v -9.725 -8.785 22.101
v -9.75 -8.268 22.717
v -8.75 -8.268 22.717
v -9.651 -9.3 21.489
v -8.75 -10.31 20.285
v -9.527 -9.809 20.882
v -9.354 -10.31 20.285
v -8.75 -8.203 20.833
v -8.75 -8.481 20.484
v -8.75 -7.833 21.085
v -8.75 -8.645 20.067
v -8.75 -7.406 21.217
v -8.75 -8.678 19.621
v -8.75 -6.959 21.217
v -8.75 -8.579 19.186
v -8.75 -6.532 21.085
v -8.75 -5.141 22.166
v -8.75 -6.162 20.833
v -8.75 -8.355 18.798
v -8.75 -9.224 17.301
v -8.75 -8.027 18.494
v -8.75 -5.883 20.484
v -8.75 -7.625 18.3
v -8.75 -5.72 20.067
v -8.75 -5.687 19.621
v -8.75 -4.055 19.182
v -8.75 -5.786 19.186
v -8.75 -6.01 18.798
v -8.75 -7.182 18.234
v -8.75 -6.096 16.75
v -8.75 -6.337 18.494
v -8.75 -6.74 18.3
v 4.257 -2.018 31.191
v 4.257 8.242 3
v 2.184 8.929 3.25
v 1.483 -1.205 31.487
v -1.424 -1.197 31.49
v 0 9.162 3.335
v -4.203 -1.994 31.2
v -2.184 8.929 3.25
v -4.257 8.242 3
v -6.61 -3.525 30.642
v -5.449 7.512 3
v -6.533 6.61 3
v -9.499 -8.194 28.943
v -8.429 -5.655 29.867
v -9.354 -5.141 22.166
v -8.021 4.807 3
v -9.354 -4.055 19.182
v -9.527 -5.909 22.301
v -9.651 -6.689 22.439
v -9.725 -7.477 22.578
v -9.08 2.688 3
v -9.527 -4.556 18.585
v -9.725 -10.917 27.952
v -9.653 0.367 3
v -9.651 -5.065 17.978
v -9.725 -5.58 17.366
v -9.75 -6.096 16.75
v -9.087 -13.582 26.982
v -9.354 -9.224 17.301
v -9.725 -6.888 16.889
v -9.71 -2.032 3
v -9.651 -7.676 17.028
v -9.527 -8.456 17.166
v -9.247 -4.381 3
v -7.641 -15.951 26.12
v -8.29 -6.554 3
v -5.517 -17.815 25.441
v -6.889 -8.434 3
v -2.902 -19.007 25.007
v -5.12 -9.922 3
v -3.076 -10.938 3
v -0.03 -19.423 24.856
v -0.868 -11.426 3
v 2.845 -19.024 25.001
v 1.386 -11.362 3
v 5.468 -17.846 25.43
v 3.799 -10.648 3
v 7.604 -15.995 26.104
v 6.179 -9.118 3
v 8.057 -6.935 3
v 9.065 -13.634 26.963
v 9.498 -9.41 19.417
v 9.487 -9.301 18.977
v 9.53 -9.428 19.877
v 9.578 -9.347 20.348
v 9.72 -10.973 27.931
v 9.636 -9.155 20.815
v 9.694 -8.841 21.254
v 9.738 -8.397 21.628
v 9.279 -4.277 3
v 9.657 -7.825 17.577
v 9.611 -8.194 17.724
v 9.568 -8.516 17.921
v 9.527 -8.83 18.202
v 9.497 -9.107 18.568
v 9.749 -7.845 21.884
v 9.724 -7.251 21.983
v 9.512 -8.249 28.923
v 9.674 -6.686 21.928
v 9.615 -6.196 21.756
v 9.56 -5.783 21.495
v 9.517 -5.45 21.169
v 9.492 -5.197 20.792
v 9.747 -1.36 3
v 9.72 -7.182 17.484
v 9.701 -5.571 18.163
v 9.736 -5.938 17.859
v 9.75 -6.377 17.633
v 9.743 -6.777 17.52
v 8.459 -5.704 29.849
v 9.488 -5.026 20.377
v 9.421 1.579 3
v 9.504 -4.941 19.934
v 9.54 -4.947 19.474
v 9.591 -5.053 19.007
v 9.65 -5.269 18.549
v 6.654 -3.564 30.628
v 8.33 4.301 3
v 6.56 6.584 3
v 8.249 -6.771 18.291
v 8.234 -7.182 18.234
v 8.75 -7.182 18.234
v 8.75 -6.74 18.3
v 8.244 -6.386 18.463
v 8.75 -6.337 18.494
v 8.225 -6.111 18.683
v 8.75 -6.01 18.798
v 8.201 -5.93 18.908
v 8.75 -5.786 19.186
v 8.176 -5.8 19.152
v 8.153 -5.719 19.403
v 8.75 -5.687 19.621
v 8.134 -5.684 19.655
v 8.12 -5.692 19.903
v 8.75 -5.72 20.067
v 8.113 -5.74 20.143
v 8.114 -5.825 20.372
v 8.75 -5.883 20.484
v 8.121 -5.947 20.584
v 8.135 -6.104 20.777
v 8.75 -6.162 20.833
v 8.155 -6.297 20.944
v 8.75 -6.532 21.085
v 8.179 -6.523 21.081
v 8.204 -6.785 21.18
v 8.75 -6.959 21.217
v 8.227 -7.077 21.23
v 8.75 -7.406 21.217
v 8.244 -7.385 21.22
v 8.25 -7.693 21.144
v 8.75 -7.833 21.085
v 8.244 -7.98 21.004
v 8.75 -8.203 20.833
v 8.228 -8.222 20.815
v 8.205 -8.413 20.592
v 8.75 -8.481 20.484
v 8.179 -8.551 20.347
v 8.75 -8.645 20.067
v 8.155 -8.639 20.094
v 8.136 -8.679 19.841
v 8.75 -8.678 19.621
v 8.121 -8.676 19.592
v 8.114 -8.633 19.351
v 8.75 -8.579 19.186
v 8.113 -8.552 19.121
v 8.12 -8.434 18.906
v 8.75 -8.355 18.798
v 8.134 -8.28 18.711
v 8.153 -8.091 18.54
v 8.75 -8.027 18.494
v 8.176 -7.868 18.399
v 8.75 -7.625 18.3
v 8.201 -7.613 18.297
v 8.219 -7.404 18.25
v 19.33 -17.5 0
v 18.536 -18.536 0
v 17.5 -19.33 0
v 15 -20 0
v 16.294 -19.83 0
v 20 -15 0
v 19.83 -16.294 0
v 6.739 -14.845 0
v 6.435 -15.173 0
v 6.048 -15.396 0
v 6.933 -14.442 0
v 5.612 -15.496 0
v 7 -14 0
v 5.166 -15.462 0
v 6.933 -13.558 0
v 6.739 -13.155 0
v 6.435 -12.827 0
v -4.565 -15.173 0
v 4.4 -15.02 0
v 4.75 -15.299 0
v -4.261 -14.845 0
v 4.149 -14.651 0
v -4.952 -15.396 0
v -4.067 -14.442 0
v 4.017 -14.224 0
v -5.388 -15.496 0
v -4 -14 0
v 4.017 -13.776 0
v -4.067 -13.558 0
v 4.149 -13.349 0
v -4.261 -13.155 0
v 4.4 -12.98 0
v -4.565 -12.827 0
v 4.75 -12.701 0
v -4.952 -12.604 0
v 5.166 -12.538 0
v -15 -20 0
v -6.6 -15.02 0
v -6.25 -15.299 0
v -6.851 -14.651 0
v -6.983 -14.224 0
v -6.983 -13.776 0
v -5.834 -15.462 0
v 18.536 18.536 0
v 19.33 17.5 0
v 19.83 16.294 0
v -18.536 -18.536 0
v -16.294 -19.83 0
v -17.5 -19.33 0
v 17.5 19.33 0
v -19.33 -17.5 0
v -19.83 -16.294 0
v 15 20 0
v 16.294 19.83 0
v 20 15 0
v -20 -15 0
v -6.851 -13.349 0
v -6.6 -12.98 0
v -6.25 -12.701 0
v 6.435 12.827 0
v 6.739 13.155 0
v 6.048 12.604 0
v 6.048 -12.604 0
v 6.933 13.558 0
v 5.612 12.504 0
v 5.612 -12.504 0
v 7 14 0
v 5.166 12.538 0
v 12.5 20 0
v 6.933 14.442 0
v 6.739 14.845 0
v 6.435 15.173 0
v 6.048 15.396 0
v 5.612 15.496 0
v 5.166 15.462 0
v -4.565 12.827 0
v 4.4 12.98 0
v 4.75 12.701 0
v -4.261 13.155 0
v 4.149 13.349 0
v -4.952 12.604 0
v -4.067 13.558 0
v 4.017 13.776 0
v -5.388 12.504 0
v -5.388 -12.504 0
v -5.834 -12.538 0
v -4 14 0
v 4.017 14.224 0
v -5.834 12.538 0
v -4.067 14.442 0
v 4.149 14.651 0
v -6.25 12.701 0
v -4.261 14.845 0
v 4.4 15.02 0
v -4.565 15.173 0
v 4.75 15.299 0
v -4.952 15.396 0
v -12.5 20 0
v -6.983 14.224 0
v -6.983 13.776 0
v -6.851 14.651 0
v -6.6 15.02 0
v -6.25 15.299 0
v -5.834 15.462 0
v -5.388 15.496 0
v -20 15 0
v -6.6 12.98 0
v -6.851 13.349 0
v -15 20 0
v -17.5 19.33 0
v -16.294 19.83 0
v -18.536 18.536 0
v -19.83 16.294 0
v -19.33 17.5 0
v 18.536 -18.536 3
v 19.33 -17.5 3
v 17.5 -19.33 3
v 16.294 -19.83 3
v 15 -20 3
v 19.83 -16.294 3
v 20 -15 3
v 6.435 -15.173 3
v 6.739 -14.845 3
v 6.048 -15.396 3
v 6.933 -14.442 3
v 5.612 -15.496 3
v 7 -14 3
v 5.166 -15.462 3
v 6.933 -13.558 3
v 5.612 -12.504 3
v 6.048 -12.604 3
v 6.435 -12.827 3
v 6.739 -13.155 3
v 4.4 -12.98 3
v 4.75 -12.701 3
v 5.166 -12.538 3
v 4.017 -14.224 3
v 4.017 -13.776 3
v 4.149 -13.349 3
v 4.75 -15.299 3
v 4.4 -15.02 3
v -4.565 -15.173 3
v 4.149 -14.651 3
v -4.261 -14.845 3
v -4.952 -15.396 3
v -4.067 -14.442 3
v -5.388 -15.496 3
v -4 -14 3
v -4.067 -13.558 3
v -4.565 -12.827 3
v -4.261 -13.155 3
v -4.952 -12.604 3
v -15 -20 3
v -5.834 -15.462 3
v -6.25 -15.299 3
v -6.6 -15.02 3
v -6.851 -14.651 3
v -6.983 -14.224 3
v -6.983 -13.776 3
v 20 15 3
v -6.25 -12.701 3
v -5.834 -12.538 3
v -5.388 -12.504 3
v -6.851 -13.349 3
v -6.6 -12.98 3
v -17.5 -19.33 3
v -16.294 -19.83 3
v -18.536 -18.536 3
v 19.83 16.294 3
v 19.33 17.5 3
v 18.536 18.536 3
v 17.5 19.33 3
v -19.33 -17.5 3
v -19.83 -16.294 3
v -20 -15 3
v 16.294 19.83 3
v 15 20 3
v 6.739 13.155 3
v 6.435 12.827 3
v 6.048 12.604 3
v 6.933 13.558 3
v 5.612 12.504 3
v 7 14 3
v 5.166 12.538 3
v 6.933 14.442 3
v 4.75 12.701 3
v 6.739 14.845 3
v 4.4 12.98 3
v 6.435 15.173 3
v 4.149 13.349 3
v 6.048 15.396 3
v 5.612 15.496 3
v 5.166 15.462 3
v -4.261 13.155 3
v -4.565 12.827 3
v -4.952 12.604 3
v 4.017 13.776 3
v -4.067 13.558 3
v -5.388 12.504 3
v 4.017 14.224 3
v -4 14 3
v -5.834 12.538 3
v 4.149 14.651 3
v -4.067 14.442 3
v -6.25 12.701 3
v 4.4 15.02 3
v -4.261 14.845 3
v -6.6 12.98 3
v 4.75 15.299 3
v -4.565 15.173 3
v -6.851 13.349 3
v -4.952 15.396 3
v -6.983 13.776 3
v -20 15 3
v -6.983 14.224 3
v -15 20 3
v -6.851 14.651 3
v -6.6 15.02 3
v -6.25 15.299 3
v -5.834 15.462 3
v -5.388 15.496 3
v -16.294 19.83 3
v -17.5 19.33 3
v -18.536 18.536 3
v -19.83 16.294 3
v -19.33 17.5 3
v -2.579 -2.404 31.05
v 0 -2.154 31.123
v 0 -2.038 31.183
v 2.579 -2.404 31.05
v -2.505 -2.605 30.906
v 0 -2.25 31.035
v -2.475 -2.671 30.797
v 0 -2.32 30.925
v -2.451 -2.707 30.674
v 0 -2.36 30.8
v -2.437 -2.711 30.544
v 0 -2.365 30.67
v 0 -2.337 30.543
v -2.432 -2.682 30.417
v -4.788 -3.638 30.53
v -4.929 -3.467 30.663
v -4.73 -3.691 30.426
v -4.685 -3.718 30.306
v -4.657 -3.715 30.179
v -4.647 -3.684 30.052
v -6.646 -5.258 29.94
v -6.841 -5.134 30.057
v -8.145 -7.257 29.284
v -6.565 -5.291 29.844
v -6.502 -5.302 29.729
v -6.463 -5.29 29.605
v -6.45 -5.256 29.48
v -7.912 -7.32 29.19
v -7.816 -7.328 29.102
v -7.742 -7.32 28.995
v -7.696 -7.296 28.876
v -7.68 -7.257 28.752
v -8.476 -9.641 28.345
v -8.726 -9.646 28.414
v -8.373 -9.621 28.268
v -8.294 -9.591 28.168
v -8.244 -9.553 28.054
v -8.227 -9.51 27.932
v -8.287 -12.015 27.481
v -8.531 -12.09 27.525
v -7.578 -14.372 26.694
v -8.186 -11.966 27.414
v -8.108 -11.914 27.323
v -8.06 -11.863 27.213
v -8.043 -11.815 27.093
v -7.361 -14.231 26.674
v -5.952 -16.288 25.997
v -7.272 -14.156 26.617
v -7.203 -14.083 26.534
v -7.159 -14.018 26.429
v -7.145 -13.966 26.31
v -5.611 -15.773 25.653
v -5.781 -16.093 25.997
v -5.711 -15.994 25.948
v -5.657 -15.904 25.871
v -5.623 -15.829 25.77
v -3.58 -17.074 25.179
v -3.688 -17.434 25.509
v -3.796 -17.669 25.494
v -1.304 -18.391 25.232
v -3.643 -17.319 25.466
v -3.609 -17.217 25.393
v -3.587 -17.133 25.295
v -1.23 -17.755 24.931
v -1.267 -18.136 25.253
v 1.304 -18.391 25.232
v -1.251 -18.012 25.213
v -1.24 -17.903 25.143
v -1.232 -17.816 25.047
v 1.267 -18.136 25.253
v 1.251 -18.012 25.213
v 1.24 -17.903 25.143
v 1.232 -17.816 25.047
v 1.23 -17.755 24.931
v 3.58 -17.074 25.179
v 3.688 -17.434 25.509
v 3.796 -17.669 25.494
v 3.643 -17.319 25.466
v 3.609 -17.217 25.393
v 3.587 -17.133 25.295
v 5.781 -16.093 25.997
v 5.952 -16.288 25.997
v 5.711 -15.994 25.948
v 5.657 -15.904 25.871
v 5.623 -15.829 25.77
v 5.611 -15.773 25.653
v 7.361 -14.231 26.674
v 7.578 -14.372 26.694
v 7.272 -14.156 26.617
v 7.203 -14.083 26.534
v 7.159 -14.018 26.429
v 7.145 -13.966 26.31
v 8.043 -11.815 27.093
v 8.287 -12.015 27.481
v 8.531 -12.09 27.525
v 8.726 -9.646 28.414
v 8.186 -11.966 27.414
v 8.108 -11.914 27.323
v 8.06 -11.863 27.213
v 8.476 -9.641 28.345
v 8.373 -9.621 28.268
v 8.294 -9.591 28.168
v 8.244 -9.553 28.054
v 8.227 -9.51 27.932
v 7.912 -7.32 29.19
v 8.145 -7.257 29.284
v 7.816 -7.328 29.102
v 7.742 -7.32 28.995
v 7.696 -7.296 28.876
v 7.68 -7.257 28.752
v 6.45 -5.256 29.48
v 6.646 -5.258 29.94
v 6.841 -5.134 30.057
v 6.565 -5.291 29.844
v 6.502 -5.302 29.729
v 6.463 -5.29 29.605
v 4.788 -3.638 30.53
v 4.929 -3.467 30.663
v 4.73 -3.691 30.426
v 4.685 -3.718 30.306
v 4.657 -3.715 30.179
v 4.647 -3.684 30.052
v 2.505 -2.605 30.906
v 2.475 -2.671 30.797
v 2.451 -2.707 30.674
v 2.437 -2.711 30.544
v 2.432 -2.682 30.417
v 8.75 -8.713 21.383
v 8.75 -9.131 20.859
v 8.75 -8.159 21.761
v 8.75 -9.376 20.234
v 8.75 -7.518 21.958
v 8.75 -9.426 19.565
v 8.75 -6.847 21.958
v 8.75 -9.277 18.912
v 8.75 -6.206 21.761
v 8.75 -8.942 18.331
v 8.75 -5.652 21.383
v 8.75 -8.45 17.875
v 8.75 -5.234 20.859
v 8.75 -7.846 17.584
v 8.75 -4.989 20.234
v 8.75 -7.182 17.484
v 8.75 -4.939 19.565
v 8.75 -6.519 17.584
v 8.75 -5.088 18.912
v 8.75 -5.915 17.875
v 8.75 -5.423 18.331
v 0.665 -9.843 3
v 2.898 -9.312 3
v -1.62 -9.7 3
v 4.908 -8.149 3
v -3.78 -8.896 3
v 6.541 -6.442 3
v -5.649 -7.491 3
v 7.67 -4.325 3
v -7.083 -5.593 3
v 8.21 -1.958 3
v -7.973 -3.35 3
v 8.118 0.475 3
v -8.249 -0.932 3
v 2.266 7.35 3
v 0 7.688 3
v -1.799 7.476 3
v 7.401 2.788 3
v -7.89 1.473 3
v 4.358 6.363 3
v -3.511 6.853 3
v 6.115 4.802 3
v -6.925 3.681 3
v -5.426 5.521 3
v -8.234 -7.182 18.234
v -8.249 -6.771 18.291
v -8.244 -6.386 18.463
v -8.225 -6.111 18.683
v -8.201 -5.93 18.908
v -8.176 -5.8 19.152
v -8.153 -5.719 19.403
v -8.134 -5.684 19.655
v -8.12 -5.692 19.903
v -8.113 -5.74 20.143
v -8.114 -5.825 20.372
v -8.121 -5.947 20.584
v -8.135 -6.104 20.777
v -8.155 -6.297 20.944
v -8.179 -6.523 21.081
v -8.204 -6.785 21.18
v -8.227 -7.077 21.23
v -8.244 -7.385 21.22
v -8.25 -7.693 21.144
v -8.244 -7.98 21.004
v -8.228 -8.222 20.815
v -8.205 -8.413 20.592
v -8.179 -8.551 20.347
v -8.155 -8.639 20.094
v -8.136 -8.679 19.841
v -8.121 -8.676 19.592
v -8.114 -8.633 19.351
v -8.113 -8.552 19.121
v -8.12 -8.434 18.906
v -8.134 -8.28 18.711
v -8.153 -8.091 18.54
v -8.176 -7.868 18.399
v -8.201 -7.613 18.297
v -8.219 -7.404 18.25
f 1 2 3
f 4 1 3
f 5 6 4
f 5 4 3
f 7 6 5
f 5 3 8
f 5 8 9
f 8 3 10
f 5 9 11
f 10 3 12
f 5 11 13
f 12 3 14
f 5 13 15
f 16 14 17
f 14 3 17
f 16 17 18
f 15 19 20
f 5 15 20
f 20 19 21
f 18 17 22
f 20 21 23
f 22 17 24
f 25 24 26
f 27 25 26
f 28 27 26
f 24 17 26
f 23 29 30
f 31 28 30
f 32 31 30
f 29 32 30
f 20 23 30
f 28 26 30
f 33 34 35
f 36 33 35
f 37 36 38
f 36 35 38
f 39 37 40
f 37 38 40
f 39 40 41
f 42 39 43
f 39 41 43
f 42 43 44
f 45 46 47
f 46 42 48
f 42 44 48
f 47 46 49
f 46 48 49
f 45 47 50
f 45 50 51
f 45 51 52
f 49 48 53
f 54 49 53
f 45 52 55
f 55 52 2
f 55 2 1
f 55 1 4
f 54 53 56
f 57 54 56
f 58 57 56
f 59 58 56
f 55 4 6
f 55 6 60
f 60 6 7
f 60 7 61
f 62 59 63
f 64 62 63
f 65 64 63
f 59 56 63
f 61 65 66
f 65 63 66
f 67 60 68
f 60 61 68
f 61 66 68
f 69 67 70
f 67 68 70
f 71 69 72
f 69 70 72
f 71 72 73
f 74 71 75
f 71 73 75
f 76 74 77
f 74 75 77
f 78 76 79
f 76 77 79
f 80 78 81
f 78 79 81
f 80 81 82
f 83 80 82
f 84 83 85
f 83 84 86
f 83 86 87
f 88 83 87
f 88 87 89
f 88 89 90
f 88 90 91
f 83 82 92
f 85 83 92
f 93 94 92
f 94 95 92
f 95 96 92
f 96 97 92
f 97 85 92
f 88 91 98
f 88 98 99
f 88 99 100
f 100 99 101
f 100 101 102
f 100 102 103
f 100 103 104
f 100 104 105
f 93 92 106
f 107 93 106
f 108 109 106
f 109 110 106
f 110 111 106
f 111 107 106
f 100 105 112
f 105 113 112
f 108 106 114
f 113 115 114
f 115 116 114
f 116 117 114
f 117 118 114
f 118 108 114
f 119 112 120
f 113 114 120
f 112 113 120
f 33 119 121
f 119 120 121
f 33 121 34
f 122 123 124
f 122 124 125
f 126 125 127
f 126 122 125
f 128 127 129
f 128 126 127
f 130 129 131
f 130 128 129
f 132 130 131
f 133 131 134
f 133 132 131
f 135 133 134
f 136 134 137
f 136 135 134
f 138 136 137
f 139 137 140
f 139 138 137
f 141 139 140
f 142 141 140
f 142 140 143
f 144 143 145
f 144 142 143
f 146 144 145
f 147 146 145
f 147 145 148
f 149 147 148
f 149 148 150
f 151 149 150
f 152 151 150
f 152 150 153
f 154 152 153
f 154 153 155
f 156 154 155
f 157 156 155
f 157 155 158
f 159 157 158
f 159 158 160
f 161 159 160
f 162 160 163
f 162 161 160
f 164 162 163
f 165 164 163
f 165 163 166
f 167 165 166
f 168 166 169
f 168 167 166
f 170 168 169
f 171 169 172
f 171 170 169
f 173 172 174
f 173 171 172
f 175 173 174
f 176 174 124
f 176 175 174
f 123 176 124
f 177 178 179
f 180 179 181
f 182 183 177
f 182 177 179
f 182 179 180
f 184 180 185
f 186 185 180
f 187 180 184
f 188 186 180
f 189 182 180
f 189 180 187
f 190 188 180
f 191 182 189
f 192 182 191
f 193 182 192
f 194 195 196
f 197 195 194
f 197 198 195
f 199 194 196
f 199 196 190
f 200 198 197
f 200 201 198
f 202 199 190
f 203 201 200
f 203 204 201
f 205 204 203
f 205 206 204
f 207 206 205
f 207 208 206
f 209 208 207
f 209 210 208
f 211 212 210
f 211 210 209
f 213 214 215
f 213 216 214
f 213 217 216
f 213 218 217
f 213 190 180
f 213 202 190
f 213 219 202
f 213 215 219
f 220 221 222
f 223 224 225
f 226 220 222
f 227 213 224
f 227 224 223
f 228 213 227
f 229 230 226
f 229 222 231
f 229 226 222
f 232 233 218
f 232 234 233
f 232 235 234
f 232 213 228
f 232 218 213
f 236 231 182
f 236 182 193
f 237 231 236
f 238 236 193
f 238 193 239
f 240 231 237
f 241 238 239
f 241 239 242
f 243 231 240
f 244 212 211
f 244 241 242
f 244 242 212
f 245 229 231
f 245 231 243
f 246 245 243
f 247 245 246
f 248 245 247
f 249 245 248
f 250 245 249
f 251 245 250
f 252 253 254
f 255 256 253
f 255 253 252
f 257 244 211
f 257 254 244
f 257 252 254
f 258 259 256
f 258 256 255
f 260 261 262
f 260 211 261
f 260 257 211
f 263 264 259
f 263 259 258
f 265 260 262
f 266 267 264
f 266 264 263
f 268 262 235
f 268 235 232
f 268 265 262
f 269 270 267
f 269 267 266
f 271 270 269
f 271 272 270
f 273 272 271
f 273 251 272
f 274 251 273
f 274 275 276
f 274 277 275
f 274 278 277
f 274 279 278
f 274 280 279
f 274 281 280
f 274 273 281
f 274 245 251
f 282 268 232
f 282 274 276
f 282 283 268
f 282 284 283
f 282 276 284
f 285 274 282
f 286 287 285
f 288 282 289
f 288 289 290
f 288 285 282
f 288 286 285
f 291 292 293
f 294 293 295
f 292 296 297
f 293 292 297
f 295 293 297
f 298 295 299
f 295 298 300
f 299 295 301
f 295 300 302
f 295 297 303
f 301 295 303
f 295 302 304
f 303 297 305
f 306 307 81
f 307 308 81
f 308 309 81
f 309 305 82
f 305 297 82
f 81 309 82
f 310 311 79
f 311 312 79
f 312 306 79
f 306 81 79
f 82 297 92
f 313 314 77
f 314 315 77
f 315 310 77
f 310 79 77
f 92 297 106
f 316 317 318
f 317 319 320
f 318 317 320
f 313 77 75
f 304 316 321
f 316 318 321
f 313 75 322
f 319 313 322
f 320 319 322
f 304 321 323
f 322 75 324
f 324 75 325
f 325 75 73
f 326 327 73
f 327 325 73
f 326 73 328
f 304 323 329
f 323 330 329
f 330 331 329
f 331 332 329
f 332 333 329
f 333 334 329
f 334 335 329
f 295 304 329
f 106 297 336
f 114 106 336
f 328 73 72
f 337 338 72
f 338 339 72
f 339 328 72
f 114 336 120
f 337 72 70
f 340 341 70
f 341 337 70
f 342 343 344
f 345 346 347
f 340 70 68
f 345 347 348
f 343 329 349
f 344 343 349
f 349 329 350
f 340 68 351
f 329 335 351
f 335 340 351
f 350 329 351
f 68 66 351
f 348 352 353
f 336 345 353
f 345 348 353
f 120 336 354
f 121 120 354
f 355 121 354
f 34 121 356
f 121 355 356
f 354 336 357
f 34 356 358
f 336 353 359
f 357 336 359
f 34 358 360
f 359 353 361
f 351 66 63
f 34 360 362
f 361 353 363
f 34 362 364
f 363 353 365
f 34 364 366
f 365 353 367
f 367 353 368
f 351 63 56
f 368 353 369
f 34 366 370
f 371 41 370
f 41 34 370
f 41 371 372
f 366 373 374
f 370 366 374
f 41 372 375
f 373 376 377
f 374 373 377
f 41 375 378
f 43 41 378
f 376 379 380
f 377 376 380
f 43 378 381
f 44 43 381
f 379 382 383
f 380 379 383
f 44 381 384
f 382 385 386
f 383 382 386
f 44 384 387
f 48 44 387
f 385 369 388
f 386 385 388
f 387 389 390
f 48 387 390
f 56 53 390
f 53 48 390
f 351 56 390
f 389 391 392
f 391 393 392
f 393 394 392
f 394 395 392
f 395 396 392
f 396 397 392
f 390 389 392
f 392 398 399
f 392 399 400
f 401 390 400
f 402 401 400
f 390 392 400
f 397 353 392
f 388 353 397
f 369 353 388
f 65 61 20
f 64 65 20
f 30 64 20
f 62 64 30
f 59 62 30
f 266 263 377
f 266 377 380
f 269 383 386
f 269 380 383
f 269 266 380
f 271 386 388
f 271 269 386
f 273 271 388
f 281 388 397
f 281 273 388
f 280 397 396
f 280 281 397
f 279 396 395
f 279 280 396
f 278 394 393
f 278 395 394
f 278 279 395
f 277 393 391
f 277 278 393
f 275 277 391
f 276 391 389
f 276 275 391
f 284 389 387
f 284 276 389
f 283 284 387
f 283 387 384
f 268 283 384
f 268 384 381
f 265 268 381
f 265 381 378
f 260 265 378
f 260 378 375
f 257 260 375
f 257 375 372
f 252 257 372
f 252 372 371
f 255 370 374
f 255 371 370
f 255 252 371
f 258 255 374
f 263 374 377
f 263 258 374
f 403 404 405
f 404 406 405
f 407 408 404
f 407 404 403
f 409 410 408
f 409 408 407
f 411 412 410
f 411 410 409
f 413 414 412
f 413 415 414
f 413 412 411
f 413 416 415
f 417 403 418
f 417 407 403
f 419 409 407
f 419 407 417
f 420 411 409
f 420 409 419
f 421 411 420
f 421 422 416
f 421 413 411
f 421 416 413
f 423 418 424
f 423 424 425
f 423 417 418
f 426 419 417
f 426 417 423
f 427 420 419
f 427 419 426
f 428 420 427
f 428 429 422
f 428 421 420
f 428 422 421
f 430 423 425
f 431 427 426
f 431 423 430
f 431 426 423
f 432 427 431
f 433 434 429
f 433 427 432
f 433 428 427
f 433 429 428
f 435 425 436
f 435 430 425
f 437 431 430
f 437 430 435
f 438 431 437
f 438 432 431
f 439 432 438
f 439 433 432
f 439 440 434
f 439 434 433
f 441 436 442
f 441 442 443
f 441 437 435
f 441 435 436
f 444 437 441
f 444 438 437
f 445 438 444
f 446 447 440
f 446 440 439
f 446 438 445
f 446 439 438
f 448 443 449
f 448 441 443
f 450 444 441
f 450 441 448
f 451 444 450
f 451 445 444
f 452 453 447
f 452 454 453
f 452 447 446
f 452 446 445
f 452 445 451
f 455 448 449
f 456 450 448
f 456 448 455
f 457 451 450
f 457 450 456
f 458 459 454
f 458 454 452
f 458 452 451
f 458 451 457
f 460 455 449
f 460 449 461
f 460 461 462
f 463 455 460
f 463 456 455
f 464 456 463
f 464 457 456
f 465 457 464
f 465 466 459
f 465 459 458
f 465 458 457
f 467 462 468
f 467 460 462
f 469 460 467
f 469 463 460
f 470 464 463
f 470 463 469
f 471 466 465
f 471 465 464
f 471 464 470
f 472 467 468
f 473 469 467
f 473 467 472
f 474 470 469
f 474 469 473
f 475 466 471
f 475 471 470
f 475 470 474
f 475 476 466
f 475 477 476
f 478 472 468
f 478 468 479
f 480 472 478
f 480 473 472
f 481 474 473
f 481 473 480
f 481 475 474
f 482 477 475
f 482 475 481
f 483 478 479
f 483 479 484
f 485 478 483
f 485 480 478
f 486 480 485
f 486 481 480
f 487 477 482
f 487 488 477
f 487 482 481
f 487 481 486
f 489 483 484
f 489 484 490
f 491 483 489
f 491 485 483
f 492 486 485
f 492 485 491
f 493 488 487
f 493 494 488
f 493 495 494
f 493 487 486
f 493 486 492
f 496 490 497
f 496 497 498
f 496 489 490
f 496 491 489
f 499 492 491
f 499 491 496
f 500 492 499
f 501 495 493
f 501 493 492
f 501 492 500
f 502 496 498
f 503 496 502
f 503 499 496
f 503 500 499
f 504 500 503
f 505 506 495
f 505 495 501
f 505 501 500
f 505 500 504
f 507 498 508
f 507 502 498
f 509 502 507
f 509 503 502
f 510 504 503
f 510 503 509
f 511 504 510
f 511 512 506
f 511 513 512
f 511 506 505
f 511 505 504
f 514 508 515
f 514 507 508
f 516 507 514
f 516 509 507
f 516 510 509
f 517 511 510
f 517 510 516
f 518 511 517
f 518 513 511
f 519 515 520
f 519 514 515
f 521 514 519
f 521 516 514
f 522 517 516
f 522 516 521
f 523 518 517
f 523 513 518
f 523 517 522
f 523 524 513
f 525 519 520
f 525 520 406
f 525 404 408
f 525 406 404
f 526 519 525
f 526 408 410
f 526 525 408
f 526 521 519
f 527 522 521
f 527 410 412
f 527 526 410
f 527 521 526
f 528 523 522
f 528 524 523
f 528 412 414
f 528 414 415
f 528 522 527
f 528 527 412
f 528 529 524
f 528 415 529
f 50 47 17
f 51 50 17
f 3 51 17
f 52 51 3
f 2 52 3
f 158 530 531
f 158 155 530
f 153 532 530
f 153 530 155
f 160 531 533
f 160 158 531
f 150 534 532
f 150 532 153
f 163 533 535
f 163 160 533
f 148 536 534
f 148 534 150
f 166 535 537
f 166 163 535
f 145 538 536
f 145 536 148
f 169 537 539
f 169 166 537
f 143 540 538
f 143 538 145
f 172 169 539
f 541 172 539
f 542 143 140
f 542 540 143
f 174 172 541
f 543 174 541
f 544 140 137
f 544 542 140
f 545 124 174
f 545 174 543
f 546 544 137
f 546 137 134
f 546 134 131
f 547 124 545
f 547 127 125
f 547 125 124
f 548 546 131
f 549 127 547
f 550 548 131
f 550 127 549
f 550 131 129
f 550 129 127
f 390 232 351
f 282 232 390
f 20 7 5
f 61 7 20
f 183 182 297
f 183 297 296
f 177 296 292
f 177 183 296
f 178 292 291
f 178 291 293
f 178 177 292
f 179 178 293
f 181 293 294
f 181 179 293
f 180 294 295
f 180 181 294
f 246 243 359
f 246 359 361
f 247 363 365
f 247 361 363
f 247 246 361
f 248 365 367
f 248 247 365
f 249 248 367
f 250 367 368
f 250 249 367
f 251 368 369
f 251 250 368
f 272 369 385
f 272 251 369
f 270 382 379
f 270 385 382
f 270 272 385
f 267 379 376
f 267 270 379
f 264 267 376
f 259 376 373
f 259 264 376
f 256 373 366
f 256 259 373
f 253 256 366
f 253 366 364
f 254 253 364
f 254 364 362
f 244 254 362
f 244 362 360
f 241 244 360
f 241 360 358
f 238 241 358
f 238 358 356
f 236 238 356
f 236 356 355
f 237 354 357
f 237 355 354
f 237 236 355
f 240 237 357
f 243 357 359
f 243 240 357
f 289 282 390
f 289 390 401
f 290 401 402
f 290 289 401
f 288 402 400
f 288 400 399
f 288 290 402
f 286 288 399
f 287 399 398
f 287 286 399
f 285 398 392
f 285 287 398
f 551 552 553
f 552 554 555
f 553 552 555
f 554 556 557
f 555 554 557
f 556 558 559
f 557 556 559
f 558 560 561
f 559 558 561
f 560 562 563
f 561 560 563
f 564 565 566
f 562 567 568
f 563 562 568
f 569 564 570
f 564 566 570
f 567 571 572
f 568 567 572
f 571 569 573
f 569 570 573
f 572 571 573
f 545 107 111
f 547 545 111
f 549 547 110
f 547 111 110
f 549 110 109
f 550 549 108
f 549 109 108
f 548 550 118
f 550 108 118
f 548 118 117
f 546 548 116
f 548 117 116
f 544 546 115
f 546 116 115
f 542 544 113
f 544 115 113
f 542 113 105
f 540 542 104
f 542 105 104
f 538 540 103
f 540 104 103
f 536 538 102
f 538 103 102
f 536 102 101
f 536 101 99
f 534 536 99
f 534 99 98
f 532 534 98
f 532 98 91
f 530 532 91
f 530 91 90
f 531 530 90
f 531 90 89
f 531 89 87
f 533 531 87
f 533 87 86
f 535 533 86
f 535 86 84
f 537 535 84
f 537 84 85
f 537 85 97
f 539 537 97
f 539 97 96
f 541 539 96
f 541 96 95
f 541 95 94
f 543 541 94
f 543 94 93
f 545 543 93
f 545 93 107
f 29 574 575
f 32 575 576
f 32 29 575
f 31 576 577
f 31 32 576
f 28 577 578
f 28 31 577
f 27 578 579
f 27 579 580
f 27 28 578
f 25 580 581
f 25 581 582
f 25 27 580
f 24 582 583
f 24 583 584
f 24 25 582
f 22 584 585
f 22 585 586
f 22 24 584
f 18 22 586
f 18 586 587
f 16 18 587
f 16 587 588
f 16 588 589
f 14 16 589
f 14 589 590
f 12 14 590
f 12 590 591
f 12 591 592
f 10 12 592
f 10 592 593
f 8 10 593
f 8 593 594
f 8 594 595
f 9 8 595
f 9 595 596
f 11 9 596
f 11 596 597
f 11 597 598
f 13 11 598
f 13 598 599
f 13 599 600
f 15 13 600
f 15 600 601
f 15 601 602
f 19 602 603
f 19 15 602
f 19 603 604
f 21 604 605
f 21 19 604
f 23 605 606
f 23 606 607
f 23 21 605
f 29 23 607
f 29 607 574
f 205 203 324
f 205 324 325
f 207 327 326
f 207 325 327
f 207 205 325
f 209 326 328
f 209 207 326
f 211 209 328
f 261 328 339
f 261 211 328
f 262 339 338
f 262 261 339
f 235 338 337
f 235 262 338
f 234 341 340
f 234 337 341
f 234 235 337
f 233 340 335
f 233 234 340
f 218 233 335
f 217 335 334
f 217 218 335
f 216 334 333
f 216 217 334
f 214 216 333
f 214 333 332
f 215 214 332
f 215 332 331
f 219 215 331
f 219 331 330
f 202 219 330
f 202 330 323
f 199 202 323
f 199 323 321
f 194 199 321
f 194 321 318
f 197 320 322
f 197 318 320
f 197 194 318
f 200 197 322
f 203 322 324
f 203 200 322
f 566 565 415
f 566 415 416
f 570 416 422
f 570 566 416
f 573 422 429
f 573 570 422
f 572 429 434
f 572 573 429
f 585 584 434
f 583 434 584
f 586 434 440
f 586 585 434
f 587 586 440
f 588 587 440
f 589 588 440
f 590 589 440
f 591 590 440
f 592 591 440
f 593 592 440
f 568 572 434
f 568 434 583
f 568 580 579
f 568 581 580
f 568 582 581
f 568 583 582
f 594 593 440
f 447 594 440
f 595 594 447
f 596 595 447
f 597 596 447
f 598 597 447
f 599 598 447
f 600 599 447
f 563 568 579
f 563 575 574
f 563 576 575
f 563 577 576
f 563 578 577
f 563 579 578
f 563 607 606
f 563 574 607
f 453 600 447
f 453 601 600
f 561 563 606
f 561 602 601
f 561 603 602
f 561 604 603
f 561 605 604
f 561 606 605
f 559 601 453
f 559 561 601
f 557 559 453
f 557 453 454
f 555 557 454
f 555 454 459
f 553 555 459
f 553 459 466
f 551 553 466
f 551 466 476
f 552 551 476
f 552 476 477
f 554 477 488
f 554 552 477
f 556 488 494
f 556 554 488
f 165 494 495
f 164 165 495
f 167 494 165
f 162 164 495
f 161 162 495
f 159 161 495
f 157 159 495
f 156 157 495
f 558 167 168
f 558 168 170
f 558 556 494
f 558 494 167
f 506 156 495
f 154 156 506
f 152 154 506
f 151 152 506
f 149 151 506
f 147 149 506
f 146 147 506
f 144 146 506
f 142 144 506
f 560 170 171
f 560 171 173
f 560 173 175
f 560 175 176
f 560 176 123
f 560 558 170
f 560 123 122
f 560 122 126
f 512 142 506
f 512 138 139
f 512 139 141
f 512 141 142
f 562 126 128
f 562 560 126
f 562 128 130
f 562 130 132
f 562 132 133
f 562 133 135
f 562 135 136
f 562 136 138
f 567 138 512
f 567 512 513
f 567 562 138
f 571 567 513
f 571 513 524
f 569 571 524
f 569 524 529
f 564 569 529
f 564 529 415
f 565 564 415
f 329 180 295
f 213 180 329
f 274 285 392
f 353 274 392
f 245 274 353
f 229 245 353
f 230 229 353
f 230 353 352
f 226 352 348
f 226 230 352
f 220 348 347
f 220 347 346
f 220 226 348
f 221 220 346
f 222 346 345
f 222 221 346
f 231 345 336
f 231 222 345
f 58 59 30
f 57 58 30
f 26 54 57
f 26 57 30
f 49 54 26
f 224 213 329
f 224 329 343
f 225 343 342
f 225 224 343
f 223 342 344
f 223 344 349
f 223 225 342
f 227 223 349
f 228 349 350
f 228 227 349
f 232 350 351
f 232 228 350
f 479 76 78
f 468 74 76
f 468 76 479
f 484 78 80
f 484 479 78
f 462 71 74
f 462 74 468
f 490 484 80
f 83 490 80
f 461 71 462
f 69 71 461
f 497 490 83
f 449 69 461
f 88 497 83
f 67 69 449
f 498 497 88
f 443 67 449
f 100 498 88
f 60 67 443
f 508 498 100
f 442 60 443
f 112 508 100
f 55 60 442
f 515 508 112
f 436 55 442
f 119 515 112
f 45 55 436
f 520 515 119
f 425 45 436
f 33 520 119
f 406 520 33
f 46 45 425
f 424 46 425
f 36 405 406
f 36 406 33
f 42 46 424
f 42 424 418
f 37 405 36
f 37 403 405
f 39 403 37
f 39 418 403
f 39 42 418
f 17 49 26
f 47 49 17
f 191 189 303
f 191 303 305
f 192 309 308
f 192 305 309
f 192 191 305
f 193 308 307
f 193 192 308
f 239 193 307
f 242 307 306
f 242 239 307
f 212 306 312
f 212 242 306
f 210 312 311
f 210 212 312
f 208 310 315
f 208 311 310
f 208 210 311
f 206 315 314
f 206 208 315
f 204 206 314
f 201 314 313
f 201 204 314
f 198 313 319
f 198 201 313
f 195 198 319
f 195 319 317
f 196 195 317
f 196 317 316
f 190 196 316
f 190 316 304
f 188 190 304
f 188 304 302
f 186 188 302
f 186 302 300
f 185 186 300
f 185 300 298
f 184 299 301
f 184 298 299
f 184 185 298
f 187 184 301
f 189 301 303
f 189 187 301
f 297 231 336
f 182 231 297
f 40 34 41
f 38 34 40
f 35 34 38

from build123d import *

# Parameters (mm, degrees)
EXTRUDE_1_DEPTH          = 3
CUT_EXTRUDE_2_DEPTH      = 29.442925307
CUT_EXTRUDE_2_DEPTH_BACK = 29.442925307
SKETCH_2_R               = 1.5
SKETCH_3_R               = 9.75
SKETCH_3_R_2             = 8.25
EXTRUDE_2_DEPTH          = 30
SKETCH_4_W               = 10.093928953
SKETCH_4_H               = 39.979180772
CUT_EXTRUDE_3_DEPTH      = 12.5
CUT_EXTRUDE_4_DEPTH      = 43.353932229
CUT_EXTRUDE_4_DEPTH_BACK = 43.353932229
SKETCH_5_R               = 1.5
SKETCH_6_R               = 2.25
CUT_EXTRUDE_5_DEPTH      = 1
CUT_EXTRUDE_6_DEPTH      = 1
FILLET_1_R               = 0.5


with BuildPart() as part:
    # 草圖1 → 填料-伸長1 (new body)
    with BuildSketch(Plane.XY):
        with BuildLine():
            Line((-15, 20), (15, 20))
            ThreePointArc((15, 20), (18.535533906, 18.535533906), (20, 15))
            Line((20, 15), (20, -15))
            ThreePointArc((20, -15), (18.535533906, -18.535533906), (15, -20))
            Line((15, -20), (-15, -20))
            ThreePointArc((-15, -20), (-18.535533906, -18.535533906), (-20, -15))
            Line((-20, -15), (-20, 15))
            ThreePointArc((-20, 15), (-18.535533906, 18.535533906), (-15, 20))
        make_face()
    extrude(amount=EXTRUDE_1_DEPTH)

    # 草圖2 → 除料-伸長2 (cut, two sides: drawn at the far end of the back side and taken through both)
    with BuildSketch(Plane.XY.offset(-CUT_EXTRUDE_2_DEPTH_BACK)):
        with Locations((-5.5, 14)):
            Circle(SKETCH_2_R)
        with Locations((5.5, 14)):
            Circle(SKETCH_2_R)
        with Locations((5.5, -14)):
            Circle(SKETCH_2_R)
        with Locations((-5.5, -14)):
            Circle(SKETCH_2_R)
    extrude(amount=CUT_EXTRUDE_2_DEPTH + CUT_EXTRUDE_2_DEPTH_BACK, mode=Mode.SUBTRACT)

    # 草圖3 → 填料-伸長2 (add)
    with BuildSketch(Plane(origin=(0, 0, 0), x_dir=(1, 0, 0), z_dir=(0, -0.34202014332566943, 0.9396926207859081))):
        Circle(SKETCH_3_R)
        Circle(SKETCH_3_R_2, mode=Mode.SUBTRACT)
    extrude(amount=EXTRUDE_2_DEPTH)

    # 草圖4 → 除料-伸長3 (cut, symmetric)
    with BuildSketch(Plane(origin=(0, 0, 0), x_dir=(0, 0, -1), z_dir=(1, 0, 0))):
        with Locations((5.046964477, 0.010409614)):
            Rectangle(SKETCH_4_W, SKETCH_4_H)
    extrude(amount=CUT_EXTRUDE_3_DEPTH, both=True, mode=Mode.SUBTRACT)

    # 草圖5 → 除料-伸長4 (cut, two sides: drawn at the far end of the back side and taken through both)
    with BuildSketch(Plane(origin=(0, 0, 0), x_dir=(0, 0, -1), z_dir=(1, 0, 0)).offset(-CUT_EXTRUDE_4_DEPTH_BACK)):
        with Locations((-19.733545037, -7.18242301)):
            Circle(SKETCH_5_R)
    extrude(amount=CUT_EXTRUDE_4_DEPTH + CUT_EXTRUDE_4_DEPTH_BACK, mode=Mode.SUBTRACT)

    # 草圖6 → 除料-伸長5 (cut)
    with BuildSketch(Plane(origin=(9.75, 0, 0), x_dir=(0, 0, -1), z_dir=(1, 0, 0))):
        with Locations((-19.733545037, -7.18242301)):
            Circle(SKETCH_6_R)
    extrude(amount=-CUT_EXTRUDE_5_DEPTH, mode=Mode.SUBTRACT)

    # 草圖7 → 除料-伸長6 (cut)
    with BuildSketch(Plane(origin=(-9.75, 0, 0), x_dir=(0, 0, -1), z_dir=(1, 0, 0))):
        Polygon((-17.301027227, -9.223547807), (-16.749620205, -6.09636319), (-19.182138015, -4.055238393), (-22.166062846, -5.141298213), (-22.717469868, -8.26848283), (-20.284952058, -10.309607627), align=None)
    extrude(amount=CUT_EXTRUDE_6_DEPTH, mode=Mode.SUBTRACT)

    # 圓角1
    fillet_1_edges = [part.edges().sort_by_distance(p)[0] for p in [
        (-8.25, -10.2606043, 28.190778624),
    ]]
    fillet(fillet_1_edges, radius=FILLET_1_R)


solid = part.part
